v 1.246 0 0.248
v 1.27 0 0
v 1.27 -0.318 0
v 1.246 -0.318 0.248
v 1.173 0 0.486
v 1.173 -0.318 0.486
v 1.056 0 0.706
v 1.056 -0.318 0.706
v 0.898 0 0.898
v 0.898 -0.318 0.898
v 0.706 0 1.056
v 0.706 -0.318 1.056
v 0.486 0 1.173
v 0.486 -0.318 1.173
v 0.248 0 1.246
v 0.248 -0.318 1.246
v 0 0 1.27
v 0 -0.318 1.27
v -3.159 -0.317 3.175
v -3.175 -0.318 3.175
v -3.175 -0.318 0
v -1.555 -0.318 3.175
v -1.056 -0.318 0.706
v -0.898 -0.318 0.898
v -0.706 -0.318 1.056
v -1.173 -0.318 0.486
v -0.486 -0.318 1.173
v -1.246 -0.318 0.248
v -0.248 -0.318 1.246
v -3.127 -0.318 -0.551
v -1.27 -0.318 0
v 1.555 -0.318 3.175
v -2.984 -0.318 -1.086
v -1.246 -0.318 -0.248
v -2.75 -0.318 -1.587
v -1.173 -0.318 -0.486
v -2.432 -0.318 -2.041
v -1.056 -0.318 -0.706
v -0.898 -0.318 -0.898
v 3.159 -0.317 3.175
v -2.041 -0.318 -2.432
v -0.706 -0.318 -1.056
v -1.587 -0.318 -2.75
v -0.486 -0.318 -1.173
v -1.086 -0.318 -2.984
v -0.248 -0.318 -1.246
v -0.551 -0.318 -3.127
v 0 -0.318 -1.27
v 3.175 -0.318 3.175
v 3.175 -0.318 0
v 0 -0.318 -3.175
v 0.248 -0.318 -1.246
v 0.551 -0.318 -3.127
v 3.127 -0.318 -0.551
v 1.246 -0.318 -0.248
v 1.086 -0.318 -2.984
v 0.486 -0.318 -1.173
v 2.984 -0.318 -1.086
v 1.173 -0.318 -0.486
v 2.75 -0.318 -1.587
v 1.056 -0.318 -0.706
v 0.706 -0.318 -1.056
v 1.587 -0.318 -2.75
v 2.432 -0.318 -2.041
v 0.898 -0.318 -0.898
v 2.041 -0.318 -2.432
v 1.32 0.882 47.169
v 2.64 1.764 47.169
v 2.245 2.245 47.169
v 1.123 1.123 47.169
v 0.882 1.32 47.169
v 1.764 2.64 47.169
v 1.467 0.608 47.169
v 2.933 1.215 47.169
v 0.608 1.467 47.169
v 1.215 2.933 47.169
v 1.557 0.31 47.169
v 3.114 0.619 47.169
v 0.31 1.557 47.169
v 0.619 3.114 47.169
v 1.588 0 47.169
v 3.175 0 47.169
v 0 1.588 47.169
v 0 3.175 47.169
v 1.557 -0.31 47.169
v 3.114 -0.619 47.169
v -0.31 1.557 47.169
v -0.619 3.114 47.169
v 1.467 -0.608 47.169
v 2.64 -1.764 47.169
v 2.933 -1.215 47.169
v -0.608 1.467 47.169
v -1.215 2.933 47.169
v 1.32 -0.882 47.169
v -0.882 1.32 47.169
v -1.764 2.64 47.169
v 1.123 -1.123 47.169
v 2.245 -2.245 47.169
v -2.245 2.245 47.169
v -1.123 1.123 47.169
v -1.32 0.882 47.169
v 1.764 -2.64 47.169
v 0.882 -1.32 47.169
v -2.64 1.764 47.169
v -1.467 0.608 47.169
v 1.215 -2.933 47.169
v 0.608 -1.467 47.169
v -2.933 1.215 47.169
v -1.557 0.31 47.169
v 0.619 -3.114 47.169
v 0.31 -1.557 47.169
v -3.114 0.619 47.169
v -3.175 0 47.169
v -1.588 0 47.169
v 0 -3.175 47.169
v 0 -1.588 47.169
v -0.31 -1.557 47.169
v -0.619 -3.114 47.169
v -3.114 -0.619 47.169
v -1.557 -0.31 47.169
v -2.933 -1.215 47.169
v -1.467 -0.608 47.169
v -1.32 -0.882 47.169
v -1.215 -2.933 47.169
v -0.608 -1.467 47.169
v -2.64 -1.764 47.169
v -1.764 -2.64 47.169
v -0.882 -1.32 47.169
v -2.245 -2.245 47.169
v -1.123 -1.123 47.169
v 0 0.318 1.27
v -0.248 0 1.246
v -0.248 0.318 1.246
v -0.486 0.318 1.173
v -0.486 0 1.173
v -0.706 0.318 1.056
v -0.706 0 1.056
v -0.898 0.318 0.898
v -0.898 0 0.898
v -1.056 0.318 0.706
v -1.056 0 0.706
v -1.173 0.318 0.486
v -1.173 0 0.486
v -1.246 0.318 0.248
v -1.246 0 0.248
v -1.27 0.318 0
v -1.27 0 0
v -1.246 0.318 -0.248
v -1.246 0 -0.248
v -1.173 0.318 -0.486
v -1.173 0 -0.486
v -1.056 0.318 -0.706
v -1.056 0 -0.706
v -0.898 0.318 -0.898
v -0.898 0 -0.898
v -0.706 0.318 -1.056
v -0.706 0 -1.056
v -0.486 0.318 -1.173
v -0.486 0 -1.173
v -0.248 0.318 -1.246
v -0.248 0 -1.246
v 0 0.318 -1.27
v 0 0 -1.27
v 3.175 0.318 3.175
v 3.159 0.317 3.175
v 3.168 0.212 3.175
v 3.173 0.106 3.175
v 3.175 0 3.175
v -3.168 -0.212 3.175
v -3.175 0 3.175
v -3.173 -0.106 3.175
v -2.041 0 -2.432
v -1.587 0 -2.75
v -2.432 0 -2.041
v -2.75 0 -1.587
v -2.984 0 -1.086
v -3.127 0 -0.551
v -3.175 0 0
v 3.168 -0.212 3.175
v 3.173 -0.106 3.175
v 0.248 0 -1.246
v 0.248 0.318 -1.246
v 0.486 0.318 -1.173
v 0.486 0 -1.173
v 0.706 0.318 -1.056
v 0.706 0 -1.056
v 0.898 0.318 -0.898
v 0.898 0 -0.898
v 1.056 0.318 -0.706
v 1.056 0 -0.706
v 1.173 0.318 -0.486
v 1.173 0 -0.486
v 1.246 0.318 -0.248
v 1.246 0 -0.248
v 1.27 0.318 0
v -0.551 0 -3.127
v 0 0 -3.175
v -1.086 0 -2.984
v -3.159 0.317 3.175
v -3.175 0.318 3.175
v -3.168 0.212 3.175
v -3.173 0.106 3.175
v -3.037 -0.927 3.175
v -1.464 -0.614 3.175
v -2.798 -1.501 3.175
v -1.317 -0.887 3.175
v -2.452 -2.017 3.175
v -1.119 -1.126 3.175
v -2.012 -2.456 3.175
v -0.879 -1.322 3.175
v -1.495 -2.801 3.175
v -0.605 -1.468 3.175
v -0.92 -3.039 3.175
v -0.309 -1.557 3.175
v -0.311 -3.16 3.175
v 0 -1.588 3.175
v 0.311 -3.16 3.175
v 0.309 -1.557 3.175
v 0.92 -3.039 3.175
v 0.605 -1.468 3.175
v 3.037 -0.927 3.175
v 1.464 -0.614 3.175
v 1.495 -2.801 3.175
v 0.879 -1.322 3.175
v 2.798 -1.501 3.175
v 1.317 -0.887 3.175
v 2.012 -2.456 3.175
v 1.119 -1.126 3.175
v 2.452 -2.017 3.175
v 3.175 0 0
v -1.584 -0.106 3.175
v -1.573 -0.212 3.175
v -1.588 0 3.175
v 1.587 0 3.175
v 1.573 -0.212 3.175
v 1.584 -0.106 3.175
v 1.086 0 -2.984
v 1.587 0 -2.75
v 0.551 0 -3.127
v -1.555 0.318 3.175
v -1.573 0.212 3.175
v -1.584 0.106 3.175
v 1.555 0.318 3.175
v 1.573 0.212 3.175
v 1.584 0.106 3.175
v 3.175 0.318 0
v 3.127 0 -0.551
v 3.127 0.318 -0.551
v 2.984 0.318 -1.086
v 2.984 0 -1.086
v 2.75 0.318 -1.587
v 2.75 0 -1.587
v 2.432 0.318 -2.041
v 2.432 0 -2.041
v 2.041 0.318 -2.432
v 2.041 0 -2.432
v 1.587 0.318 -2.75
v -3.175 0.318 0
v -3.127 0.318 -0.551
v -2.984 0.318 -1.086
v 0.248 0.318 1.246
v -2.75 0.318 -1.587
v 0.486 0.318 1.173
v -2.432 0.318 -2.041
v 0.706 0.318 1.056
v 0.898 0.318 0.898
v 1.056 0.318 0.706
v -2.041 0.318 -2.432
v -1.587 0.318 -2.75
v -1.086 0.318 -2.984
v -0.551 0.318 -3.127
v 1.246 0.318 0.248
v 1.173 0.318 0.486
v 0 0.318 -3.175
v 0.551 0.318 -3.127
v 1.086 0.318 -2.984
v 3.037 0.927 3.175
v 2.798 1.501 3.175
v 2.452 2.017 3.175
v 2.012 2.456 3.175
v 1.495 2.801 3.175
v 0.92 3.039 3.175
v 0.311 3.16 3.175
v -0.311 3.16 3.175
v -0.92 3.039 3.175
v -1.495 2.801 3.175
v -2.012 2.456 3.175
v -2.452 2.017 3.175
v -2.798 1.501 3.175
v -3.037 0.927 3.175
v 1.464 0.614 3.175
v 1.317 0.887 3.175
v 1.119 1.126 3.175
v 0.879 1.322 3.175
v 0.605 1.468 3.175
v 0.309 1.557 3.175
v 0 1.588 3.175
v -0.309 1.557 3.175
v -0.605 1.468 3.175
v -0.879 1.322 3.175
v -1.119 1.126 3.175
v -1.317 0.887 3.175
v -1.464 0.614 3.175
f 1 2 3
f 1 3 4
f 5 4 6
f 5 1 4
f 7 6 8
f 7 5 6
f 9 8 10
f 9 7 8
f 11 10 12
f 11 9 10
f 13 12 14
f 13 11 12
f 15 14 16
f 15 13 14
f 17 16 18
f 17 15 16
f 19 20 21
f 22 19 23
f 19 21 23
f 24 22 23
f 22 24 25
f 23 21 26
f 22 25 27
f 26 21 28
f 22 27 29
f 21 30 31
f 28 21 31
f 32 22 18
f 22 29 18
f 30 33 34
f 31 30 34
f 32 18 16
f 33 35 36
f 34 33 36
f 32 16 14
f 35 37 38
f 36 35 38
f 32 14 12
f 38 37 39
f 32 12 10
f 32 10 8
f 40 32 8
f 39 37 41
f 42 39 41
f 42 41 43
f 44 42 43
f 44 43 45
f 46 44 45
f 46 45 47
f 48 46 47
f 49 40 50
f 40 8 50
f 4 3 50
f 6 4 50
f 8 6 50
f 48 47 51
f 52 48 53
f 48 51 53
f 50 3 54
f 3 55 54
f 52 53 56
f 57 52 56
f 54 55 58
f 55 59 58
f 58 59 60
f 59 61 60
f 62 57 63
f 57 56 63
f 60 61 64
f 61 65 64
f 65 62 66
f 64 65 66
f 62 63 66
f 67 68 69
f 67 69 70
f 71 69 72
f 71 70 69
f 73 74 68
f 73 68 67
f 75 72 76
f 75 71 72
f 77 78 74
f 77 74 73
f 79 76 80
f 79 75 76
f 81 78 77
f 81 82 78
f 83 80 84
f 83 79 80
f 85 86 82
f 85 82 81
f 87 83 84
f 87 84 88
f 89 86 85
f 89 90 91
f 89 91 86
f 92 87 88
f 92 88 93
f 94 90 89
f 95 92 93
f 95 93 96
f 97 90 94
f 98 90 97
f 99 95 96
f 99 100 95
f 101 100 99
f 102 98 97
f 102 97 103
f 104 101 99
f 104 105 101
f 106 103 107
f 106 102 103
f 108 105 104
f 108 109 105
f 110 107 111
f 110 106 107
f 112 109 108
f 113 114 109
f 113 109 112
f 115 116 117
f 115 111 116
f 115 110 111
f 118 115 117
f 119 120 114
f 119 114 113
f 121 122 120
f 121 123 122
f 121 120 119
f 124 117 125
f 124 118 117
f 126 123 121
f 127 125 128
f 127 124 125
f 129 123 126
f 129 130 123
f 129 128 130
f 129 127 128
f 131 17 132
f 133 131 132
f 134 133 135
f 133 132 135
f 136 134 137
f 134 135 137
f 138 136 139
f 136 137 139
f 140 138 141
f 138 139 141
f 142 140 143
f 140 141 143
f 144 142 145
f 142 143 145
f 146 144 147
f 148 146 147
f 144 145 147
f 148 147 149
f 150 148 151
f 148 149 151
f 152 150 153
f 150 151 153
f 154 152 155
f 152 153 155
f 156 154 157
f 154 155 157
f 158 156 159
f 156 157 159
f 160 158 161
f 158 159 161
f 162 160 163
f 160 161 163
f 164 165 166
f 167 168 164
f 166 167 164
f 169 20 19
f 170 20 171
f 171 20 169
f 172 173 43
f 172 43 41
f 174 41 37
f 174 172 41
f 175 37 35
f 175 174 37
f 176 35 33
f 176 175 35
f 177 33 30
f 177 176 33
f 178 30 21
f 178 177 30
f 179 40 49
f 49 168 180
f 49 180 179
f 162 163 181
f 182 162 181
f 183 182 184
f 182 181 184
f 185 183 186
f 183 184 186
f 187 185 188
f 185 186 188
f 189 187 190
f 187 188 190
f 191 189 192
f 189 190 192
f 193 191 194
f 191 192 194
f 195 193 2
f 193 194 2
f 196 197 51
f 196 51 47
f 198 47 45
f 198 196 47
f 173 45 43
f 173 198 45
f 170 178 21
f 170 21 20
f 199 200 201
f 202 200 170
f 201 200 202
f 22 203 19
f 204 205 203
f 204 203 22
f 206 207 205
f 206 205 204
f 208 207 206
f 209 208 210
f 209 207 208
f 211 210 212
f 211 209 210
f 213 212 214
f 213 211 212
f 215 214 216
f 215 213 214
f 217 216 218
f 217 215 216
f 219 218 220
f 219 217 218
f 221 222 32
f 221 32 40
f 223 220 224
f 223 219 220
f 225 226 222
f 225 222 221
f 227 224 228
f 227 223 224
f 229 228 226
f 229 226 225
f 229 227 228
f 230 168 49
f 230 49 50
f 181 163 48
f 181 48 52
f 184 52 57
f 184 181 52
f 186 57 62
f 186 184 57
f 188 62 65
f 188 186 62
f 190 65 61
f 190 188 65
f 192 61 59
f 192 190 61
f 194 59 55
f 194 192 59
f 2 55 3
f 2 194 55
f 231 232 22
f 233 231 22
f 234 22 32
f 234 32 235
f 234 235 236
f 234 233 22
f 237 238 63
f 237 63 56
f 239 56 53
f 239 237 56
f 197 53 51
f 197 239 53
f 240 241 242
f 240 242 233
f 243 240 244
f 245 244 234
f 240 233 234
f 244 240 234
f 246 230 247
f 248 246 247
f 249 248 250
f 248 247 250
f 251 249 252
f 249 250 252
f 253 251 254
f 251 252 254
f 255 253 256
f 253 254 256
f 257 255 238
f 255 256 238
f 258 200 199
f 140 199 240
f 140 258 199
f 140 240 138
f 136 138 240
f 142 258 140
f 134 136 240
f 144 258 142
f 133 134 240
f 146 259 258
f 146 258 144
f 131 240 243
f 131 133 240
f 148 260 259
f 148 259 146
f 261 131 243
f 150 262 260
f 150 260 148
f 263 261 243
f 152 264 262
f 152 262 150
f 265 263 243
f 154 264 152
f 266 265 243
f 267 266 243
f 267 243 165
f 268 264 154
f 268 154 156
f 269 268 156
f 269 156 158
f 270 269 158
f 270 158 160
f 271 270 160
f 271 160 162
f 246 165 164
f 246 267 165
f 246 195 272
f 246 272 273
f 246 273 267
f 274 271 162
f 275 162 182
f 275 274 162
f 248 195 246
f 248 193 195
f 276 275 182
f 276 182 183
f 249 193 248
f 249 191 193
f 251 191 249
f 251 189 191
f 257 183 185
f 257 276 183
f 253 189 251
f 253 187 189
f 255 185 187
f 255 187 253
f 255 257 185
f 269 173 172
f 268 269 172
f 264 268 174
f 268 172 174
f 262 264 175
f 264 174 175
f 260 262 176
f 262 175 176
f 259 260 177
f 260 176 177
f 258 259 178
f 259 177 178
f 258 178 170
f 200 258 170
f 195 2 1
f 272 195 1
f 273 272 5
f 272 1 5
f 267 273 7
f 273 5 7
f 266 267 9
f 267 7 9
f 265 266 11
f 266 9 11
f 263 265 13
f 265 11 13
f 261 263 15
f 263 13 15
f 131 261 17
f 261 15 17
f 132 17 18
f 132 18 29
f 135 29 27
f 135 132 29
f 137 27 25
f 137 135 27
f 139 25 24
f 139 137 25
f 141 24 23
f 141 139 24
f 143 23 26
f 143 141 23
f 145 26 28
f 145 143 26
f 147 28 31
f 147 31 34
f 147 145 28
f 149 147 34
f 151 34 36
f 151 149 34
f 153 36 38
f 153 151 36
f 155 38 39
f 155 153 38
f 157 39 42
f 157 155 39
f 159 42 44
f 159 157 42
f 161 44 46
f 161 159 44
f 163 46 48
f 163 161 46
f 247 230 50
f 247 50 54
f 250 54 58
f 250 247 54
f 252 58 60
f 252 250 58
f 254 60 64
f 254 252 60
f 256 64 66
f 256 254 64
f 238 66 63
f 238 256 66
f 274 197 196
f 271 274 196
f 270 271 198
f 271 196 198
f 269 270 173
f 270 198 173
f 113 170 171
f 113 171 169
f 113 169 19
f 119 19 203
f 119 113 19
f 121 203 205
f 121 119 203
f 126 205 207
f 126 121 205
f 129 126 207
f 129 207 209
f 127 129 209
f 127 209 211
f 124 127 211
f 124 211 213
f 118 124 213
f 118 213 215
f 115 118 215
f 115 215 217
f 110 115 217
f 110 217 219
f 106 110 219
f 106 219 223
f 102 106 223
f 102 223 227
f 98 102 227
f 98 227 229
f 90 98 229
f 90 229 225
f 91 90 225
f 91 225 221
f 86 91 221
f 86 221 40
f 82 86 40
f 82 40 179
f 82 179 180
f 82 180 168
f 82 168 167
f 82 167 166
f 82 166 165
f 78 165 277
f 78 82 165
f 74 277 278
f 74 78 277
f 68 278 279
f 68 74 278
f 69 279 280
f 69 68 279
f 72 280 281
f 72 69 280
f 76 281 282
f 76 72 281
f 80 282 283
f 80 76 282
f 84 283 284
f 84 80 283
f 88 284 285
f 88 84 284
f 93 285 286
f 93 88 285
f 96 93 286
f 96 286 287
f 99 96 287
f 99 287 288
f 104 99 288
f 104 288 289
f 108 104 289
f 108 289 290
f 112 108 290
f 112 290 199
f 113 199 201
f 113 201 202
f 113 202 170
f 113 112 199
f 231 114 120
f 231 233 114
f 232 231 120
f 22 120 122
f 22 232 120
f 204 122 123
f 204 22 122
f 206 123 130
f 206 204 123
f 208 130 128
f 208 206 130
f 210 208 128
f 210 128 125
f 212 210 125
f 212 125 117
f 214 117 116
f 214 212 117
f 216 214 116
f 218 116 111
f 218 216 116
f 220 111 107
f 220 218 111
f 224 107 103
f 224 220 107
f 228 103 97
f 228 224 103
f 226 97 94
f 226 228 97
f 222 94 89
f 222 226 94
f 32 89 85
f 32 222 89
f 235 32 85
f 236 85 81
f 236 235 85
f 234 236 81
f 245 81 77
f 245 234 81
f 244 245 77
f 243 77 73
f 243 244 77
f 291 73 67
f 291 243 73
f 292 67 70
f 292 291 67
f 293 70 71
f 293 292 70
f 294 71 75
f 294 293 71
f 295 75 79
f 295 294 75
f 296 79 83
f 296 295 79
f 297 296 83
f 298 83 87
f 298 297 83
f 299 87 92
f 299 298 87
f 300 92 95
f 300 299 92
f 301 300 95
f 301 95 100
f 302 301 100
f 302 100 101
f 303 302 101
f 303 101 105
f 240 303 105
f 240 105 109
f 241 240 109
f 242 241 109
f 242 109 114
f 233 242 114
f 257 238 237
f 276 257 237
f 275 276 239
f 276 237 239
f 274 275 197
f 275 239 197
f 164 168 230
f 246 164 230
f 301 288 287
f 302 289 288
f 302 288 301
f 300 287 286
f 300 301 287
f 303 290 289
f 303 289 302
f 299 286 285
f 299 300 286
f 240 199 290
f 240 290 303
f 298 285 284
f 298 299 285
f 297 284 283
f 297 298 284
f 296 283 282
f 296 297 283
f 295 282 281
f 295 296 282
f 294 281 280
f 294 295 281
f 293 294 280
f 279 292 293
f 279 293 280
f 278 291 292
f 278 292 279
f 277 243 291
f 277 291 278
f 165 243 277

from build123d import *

# Parameters (mm, degrees)
BOSS_EXTRUDE1_DEPTH      = 0.3175
BOSS_EXTRUDE1_DEPTH_BACK = 0.3175
SKETCH1_10_R             = 1.27


with BuildPart() as part:
    # Sketch1 → Revolve6 (revolve)
    with BuildSketch(Plane(origin=(0, 0, 0), x_dir=(1, 0, 0), z_dir=(0, 1, 0))):
        Polygon((-3.175, -47.169090574), (-1.5875, -47.169090574), (-1.5875, -28.575), (-1.5875, -3.175), (-3.175, -3.175), align=None)
    revolve(axis=Axis((0, 0, 0), (0, 0, 1)))

    # Sketch1<10> → Boss-Extrude1 (add, two sides: drawn at the far end of the back side and taken through both)
    with BuildSketch(Plane(origin=(0, 0, 0), x_dir=(1, 0, 0), z_dir=(0, 1, 0)).offset(-BOSS_EXTRUDE1_DEPTH_BACK)):
        with BuildLine():
            Line((3.175, -3.175), (3.175, 0))
            ThreePointArc((3.175, 0), (0, 3.175), (-3.175, 0))
            Line((-3.175, 0), (-3.175, -3.175))
            Line((-3.175, -3.175), (3.175, -3.175))
        make_face()
        Circle(SKETCH1_10_R, mode=Mode.SUBTRACT)
    extrude(amount=BOSS_EXTRUDE1_DEPTH + BOSS_EXTRUDE1_DEPTH_BACK)


solid = part.part
